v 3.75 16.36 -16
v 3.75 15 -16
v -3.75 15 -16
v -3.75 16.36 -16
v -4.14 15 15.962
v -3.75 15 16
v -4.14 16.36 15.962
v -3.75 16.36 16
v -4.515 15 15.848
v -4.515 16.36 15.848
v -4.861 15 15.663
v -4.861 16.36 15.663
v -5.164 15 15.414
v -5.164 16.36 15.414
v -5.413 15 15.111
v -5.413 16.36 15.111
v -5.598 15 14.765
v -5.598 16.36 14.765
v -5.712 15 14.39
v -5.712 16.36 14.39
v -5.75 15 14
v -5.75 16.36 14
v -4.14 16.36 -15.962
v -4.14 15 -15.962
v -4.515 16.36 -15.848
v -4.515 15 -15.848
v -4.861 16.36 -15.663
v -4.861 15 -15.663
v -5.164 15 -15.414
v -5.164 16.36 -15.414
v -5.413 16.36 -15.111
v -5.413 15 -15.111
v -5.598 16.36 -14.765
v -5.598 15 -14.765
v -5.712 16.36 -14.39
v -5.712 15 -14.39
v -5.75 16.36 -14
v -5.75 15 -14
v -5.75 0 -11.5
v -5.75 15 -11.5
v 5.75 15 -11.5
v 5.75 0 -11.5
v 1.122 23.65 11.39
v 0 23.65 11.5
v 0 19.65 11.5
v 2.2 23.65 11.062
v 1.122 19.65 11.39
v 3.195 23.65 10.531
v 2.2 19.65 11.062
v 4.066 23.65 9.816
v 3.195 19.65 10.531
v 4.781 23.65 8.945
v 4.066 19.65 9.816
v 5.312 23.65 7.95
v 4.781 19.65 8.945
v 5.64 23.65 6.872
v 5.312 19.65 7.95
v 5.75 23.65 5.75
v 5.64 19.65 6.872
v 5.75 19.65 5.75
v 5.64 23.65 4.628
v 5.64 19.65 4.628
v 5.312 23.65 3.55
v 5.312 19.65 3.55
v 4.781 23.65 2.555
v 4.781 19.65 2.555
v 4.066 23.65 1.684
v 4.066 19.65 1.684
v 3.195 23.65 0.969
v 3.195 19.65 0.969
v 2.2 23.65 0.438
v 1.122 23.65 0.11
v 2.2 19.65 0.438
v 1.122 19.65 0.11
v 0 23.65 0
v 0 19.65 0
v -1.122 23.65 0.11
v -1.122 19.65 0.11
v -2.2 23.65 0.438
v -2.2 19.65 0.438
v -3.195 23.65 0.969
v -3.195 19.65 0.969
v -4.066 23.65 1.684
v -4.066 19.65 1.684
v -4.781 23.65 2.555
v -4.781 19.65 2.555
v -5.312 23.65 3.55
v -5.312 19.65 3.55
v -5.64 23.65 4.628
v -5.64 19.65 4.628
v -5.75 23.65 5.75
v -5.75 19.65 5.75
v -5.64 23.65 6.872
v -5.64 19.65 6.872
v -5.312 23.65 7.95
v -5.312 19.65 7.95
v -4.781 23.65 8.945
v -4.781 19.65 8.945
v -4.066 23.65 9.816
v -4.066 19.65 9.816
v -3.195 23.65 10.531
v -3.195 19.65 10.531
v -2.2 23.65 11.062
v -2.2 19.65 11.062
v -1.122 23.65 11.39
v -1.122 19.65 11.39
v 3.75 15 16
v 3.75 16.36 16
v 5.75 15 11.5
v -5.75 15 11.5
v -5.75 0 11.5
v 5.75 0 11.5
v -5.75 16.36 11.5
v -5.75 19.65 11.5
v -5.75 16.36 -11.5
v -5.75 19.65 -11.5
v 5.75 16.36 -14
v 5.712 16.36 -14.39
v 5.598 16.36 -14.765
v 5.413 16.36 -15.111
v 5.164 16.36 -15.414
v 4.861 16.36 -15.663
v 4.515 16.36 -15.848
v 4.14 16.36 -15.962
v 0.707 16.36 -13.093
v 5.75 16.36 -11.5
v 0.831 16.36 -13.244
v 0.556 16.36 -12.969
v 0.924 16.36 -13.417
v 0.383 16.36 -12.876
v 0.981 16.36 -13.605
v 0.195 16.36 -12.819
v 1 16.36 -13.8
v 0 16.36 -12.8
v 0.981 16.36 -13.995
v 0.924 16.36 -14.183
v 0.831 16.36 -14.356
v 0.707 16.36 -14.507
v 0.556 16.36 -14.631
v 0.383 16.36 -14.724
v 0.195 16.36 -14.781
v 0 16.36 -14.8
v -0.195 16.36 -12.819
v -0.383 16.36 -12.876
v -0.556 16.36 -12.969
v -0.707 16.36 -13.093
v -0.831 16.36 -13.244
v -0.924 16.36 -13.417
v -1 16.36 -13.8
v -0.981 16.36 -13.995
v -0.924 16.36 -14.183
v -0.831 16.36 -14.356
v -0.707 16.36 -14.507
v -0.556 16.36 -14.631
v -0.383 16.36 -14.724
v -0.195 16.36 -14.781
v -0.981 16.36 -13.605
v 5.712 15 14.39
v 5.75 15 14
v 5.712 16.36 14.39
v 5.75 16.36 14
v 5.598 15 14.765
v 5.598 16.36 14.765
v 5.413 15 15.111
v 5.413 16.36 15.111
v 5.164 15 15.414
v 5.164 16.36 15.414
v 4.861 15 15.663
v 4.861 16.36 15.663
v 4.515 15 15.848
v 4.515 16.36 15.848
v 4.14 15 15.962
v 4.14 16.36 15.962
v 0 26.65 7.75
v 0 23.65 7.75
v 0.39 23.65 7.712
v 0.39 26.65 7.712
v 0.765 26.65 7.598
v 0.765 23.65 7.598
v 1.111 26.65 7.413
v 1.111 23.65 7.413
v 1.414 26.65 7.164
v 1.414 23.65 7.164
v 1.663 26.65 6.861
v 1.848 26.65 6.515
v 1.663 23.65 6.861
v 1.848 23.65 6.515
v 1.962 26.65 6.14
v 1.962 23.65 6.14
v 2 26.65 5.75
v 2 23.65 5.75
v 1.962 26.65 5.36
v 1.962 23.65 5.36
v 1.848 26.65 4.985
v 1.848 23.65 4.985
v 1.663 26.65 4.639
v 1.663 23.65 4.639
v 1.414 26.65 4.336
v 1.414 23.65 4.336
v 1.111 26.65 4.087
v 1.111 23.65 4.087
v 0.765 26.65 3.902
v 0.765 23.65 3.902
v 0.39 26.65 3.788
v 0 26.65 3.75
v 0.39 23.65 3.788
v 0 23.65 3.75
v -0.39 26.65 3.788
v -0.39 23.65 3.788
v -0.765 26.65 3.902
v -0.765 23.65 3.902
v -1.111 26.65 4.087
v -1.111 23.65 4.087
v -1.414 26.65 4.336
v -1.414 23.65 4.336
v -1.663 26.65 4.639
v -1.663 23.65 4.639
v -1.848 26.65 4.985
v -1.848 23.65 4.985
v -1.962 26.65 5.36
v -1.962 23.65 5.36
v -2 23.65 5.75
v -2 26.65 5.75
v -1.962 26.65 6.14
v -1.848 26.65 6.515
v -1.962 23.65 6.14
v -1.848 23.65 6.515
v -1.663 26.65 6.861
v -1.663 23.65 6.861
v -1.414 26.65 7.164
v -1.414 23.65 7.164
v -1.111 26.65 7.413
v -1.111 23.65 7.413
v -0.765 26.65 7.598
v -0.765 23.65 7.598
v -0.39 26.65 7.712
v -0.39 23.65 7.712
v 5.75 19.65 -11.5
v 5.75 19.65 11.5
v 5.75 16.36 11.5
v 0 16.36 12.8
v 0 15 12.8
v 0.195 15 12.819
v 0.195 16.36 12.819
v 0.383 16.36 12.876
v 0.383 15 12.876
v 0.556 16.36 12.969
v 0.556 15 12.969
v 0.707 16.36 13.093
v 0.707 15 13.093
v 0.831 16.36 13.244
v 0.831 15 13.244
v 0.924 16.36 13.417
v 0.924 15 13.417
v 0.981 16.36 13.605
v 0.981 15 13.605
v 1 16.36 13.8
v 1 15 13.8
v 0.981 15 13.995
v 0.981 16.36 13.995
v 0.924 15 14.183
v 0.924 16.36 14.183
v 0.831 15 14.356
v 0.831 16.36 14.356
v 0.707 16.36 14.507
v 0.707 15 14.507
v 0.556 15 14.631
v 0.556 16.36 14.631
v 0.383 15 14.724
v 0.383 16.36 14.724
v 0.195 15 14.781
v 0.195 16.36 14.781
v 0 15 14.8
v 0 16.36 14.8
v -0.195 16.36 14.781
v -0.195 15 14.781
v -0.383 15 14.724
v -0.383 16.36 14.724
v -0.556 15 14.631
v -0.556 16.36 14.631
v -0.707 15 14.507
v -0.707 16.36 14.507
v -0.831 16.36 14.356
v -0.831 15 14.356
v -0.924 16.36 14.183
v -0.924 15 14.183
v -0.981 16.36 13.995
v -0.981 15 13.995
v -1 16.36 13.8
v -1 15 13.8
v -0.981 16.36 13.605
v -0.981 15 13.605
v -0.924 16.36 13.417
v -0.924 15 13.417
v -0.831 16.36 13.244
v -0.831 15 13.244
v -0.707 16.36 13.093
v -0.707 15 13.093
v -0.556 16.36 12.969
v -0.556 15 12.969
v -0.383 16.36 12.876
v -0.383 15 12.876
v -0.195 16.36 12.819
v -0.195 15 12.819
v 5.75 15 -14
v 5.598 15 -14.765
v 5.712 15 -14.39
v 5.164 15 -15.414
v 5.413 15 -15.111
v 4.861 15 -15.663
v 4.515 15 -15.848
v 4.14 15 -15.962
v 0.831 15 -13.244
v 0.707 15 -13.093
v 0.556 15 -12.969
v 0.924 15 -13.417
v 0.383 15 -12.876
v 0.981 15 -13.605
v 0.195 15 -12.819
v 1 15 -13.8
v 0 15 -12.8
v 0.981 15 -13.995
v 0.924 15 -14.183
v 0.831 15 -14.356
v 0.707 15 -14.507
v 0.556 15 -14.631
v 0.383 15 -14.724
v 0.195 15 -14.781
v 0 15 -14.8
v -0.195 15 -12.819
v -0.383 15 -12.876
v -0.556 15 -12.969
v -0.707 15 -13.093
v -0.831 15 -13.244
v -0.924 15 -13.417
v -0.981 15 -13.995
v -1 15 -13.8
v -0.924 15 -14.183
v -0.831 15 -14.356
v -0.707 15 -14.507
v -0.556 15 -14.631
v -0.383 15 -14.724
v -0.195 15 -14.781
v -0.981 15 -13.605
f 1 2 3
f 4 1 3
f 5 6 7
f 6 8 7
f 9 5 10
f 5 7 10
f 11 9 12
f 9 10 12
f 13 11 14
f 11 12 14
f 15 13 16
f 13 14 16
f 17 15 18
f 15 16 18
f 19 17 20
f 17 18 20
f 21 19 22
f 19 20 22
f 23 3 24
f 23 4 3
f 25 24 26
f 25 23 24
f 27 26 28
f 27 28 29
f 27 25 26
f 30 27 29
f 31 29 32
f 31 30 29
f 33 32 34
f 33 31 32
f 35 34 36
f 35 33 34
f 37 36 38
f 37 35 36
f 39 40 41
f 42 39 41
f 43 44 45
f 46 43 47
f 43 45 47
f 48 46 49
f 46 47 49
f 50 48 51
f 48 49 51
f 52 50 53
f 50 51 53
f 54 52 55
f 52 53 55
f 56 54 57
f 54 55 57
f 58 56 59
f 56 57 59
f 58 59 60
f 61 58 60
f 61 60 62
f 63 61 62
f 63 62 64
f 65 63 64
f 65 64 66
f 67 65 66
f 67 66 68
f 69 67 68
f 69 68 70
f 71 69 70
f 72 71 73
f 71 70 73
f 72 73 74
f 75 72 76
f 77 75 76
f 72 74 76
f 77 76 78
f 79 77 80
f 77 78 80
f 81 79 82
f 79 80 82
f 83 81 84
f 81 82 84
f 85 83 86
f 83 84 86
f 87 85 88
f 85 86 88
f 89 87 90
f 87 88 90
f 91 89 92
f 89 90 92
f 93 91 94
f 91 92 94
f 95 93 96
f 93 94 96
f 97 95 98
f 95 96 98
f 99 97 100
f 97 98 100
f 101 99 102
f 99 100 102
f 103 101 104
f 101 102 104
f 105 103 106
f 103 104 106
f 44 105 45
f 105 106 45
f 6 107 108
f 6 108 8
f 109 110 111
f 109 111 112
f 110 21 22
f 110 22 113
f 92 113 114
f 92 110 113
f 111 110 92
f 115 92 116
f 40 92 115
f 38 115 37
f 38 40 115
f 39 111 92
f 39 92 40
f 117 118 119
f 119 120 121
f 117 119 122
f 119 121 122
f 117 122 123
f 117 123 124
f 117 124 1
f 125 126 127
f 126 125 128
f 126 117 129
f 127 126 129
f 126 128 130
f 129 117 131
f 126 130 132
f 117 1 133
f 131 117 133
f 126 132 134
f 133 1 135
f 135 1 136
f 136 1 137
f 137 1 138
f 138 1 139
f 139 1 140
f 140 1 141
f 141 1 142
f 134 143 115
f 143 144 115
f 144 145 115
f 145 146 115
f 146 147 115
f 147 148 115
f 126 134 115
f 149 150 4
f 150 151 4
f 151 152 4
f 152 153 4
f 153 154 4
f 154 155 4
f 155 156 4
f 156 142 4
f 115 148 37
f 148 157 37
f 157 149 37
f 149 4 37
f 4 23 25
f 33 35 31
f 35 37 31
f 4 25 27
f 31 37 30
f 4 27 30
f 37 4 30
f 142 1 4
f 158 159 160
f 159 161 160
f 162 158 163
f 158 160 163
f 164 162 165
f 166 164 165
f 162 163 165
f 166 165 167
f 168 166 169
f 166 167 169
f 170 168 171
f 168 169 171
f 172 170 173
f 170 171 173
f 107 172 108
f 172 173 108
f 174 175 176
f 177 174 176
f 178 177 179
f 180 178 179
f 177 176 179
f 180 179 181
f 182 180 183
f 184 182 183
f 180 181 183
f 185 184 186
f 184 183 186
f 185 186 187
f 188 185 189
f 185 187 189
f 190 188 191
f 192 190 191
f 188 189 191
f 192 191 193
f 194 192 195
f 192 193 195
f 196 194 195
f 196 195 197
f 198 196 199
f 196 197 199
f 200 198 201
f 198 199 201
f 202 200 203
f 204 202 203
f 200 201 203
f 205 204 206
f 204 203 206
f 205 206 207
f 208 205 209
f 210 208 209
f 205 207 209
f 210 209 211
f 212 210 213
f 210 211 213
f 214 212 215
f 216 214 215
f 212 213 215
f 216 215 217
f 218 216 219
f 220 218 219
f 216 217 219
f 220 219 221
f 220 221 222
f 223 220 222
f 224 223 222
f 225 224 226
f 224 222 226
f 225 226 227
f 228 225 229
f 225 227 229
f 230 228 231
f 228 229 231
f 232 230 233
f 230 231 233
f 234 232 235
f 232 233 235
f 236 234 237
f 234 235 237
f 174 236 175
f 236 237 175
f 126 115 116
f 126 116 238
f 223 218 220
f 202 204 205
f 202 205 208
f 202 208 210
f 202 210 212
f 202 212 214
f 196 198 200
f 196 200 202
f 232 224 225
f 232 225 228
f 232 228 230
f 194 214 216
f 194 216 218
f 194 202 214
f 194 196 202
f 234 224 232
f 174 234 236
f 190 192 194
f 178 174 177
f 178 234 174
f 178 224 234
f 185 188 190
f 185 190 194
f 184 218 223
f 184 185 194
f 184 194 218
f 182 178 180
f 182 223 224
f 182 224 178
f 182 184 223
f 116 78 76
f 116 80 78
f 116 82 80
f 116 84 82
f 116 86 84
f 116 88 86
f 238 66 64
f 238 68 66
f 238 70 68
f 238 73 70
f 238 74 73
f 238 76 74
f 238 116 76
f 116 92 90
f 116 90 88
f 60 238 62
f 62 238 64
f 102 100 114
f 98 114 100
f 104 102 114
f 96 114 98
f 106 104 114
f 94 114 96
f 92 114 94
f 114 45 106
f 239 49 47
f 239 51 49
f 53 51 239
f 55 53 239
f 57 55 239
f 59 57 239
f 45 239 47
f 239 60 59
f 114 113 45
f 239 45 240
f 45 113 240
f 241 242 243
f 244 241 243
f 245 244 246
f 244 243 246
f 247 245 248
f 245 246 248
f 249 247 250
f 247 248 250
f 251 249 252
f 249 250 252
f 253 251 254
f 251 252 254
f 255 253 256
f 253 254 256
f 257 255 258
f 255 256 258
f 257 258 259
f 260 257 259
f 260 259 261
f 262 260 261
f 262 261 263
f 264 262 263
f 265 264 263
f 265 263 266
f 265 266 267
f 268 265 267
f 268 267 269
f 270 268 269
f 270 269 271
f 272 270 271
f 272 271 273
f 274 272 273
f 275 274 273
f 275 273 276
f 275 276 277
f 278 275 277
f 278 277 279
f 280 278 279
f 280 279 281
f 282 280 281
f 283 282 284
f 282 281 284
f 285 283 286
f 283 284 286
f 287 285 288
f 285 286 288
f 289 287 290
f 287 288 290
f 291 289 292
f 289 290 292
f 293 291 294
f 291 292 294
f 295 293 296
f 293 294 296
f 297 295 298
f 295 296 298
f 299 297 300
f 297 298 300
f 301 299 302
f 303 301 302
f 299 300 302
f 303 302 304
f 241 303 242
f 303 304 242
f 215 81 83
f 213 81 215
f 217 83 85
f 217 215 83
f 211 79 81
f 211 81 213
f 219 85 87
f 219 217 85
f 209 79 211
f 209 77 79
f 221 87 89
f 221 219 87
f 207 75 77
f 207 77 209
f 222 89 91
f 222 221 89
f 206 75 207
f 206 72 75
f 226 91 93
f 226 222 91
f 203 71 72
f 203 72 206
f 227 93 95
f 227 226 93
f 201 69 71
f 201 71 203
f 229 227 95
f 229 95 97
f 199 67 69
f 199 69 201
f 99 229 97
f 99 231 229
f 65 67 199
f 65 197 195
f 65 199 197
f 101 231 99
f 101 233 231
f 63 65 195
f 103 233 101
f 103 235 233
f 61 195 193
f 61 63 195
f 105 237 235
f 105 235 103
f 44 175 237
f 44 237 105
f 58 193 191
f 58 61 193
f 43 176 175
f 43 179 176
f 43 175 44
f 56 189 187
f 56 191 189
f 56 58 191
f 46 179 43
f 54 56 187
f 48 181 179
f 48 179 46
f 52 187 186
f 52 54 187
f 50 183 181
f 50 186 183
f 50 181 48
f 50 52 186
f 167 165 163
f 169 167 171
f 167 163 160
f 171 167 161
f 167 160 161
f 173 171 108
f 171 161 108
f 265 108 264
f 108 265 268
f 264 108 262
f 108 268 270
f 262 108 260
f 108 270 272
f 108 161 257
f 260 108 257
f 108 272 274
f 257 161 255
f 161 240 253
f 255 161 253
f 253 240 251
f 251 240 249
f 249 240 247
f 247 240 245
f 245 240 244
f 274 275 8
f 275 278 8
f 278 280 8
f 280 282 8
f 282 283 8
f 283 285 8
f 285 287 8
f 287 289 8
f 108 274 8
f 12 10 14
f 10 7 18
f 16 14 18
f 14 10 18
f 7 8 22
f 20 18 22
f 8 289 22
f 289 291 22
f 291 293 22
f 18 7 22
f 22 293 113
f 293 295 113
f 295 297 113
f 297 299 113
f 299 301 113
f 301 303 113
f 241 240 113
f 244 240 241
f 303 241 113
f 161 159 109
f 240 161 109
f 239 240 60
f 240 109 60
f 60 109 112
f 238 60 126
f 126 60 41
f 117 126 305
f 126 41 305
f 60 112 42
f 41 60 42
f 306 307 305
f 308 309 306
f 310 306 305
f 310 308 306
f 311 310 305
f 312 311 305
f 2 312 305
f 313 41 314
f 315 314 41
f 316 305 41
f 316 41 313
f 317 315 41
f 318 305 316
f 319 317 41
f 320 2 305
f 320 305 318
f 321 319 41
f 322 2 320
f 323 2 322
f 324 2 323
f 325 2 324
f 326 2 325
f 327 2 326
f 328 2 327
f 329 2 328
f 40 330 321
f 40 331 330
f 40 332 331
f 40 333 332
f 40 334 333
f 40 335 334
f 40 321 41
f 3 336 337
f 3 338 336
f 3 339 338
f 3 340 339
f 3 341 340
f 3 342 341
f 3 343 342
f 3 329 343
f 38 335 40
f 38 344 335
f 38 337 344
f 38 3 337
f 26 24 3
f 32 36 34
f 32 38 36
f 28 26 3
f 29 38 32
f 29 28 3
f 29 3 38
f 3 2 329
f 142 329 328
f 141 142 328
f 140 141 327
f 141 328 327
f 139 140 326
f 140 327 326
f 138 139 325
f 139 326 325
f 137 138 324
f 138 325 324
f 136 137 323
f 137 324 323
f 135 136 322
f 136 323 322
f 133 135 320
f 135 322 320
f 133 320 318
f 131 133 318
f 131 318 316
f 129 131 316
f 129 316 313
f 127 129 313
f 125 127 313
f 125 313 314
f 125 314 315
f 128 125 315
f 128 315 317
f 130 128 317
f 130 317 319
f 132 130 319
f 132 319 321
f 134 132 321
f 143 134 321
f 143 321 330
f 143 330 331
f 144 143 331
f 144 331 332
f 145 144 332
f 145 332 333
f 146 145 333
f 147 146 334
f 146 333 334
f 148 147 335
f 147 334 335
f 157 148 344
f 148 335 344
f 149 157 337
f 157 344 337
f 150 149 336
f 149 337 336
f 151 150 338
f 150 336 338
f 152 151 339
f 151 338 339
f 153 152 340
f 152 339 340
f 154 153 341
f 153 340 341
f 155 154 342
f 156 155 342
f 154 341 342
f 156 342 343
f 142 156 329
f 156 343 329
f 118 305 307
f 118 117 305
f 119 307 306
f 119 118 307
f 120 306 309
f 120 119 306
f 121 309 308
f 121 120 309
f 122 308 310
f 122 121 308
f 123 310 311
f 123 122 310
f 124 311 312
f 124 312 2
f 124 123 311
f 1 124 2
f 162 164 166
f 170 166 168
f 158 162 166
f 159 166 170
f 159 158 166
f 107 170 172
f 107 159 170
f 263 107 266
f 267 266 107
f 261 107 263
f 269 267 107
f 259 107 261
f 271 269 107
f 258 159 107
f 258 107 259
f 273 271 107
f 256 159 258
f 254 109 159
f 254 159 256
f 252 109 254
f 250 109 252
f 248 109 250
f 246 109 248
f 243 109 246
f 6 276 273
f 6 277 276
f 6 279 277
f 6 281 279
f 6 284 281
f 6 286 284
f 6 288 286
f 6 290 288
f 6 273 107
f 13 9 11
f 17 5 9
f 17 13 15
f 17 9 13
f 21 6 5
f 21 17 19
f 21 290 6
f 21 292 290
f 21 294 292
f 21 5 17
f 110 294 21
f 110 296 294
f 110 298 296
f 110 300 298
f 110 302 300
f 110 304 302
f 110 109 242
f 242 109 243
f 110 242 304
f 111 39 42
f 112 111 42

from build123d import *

# Parameters (mm, degrees)
SKETCH_1_W          = 11.5
SKETCH_1_H          = 23
EXTRUDE_1_DEPTH     = 19.65
SKETCH_3_W          = 11.5
SKETCH_3_H          = 32
EXTRUDE_3_DEPTH     = 1.36
SKETCH_4_R          = 1
CUT_EXTRUDE_1_DEPTH = 5
FILLET_8_R          = 2
SKETCH_9_R          = 5.75
EXTRUDE_7_DEPTH     = 4
SKETCH_10_R         = 2
EXTRUDE_8_DEPTH     = 3


with BuildPart() as part:
    # 草图1 → 凸台-拉伸1 (new body)
    with BuildSketch(Plane(origin=(0, 0, 0), x_dir=(1, 0, 0), z_dir=(0, 1, 0))):
        Rectangle(SKETCH_1_W, SKETCH_1_H)
    extrude(amount=EXTRUDE_1_DEPTH)

    # 草图3 → 凸台-拉伸3 (add)
    with BuildSketch(Plane(origin=(0, 15, 0), x_dir=(-1, 0, 0), z_dir=(0, -1, 0))):
        Rectangle(SKETCH_3_W, SKETCH_3_H)
    extrude(amount=-EXTRUDE_3_DEPTH)

    # 草图4 → 切除-拉伸1 (cut)
    with BuildSketch(Plane(origin=(0, 15, 0), x_dir=(-1, 0, 0), z_dir=(0, -1, 0))):
        with Locations(Location((0, 13.8, 0), (0, 0, 90))):
            Circle(SKETCH_4_R)
        with Locations(Location((0, -13.8, 0), (0, 0, 90))):
            Circle(SKETCH_4_R)
    extrude(amount=-CUT_EXTRUDE_1_DEPTH, mode=Mode.SUBTRACT)

    # 圆角8
    fillet_8_edges = [part.edges().sort_by_distance(p)[0] for p in [
        (-5.75, 15.68, -16),
        (5.75, 15.68, 16),
        (-5.75, 15.68, 16),
        (5.75, 15.68, -16),
    ]]
    fillet(fillet_8_edges, radius=FILLET_8_R)

    # 草图9 → 凸台-拉伸7 (add)
    with BuildSketch(Plane(origin=(0, 19.65, 0), x_dir=(1, 0, 0), z_dir=(0, 1, 0))):
        with Locations(Location((0, -5.75, 0), (0, 0, 270))):
            Circle(SKETCH_9_R)
    extrude(amount=EXTRUDE_7_DEPTH)

    # 草图10 → 凸台-拉伸8 (add)
    with BuildSketch(Plane(origin=(0, 23.65, 0), x_dir=(1, 0, 0), z_dir=(0, 1, 0))):
        with Locations(Location((0, -5.75, 0), (0, 0, 270))):
            Circle(SKETCH_10_R)
    extrude(amount=EXTRUDE_8_DEPTH)


solid = part.part
